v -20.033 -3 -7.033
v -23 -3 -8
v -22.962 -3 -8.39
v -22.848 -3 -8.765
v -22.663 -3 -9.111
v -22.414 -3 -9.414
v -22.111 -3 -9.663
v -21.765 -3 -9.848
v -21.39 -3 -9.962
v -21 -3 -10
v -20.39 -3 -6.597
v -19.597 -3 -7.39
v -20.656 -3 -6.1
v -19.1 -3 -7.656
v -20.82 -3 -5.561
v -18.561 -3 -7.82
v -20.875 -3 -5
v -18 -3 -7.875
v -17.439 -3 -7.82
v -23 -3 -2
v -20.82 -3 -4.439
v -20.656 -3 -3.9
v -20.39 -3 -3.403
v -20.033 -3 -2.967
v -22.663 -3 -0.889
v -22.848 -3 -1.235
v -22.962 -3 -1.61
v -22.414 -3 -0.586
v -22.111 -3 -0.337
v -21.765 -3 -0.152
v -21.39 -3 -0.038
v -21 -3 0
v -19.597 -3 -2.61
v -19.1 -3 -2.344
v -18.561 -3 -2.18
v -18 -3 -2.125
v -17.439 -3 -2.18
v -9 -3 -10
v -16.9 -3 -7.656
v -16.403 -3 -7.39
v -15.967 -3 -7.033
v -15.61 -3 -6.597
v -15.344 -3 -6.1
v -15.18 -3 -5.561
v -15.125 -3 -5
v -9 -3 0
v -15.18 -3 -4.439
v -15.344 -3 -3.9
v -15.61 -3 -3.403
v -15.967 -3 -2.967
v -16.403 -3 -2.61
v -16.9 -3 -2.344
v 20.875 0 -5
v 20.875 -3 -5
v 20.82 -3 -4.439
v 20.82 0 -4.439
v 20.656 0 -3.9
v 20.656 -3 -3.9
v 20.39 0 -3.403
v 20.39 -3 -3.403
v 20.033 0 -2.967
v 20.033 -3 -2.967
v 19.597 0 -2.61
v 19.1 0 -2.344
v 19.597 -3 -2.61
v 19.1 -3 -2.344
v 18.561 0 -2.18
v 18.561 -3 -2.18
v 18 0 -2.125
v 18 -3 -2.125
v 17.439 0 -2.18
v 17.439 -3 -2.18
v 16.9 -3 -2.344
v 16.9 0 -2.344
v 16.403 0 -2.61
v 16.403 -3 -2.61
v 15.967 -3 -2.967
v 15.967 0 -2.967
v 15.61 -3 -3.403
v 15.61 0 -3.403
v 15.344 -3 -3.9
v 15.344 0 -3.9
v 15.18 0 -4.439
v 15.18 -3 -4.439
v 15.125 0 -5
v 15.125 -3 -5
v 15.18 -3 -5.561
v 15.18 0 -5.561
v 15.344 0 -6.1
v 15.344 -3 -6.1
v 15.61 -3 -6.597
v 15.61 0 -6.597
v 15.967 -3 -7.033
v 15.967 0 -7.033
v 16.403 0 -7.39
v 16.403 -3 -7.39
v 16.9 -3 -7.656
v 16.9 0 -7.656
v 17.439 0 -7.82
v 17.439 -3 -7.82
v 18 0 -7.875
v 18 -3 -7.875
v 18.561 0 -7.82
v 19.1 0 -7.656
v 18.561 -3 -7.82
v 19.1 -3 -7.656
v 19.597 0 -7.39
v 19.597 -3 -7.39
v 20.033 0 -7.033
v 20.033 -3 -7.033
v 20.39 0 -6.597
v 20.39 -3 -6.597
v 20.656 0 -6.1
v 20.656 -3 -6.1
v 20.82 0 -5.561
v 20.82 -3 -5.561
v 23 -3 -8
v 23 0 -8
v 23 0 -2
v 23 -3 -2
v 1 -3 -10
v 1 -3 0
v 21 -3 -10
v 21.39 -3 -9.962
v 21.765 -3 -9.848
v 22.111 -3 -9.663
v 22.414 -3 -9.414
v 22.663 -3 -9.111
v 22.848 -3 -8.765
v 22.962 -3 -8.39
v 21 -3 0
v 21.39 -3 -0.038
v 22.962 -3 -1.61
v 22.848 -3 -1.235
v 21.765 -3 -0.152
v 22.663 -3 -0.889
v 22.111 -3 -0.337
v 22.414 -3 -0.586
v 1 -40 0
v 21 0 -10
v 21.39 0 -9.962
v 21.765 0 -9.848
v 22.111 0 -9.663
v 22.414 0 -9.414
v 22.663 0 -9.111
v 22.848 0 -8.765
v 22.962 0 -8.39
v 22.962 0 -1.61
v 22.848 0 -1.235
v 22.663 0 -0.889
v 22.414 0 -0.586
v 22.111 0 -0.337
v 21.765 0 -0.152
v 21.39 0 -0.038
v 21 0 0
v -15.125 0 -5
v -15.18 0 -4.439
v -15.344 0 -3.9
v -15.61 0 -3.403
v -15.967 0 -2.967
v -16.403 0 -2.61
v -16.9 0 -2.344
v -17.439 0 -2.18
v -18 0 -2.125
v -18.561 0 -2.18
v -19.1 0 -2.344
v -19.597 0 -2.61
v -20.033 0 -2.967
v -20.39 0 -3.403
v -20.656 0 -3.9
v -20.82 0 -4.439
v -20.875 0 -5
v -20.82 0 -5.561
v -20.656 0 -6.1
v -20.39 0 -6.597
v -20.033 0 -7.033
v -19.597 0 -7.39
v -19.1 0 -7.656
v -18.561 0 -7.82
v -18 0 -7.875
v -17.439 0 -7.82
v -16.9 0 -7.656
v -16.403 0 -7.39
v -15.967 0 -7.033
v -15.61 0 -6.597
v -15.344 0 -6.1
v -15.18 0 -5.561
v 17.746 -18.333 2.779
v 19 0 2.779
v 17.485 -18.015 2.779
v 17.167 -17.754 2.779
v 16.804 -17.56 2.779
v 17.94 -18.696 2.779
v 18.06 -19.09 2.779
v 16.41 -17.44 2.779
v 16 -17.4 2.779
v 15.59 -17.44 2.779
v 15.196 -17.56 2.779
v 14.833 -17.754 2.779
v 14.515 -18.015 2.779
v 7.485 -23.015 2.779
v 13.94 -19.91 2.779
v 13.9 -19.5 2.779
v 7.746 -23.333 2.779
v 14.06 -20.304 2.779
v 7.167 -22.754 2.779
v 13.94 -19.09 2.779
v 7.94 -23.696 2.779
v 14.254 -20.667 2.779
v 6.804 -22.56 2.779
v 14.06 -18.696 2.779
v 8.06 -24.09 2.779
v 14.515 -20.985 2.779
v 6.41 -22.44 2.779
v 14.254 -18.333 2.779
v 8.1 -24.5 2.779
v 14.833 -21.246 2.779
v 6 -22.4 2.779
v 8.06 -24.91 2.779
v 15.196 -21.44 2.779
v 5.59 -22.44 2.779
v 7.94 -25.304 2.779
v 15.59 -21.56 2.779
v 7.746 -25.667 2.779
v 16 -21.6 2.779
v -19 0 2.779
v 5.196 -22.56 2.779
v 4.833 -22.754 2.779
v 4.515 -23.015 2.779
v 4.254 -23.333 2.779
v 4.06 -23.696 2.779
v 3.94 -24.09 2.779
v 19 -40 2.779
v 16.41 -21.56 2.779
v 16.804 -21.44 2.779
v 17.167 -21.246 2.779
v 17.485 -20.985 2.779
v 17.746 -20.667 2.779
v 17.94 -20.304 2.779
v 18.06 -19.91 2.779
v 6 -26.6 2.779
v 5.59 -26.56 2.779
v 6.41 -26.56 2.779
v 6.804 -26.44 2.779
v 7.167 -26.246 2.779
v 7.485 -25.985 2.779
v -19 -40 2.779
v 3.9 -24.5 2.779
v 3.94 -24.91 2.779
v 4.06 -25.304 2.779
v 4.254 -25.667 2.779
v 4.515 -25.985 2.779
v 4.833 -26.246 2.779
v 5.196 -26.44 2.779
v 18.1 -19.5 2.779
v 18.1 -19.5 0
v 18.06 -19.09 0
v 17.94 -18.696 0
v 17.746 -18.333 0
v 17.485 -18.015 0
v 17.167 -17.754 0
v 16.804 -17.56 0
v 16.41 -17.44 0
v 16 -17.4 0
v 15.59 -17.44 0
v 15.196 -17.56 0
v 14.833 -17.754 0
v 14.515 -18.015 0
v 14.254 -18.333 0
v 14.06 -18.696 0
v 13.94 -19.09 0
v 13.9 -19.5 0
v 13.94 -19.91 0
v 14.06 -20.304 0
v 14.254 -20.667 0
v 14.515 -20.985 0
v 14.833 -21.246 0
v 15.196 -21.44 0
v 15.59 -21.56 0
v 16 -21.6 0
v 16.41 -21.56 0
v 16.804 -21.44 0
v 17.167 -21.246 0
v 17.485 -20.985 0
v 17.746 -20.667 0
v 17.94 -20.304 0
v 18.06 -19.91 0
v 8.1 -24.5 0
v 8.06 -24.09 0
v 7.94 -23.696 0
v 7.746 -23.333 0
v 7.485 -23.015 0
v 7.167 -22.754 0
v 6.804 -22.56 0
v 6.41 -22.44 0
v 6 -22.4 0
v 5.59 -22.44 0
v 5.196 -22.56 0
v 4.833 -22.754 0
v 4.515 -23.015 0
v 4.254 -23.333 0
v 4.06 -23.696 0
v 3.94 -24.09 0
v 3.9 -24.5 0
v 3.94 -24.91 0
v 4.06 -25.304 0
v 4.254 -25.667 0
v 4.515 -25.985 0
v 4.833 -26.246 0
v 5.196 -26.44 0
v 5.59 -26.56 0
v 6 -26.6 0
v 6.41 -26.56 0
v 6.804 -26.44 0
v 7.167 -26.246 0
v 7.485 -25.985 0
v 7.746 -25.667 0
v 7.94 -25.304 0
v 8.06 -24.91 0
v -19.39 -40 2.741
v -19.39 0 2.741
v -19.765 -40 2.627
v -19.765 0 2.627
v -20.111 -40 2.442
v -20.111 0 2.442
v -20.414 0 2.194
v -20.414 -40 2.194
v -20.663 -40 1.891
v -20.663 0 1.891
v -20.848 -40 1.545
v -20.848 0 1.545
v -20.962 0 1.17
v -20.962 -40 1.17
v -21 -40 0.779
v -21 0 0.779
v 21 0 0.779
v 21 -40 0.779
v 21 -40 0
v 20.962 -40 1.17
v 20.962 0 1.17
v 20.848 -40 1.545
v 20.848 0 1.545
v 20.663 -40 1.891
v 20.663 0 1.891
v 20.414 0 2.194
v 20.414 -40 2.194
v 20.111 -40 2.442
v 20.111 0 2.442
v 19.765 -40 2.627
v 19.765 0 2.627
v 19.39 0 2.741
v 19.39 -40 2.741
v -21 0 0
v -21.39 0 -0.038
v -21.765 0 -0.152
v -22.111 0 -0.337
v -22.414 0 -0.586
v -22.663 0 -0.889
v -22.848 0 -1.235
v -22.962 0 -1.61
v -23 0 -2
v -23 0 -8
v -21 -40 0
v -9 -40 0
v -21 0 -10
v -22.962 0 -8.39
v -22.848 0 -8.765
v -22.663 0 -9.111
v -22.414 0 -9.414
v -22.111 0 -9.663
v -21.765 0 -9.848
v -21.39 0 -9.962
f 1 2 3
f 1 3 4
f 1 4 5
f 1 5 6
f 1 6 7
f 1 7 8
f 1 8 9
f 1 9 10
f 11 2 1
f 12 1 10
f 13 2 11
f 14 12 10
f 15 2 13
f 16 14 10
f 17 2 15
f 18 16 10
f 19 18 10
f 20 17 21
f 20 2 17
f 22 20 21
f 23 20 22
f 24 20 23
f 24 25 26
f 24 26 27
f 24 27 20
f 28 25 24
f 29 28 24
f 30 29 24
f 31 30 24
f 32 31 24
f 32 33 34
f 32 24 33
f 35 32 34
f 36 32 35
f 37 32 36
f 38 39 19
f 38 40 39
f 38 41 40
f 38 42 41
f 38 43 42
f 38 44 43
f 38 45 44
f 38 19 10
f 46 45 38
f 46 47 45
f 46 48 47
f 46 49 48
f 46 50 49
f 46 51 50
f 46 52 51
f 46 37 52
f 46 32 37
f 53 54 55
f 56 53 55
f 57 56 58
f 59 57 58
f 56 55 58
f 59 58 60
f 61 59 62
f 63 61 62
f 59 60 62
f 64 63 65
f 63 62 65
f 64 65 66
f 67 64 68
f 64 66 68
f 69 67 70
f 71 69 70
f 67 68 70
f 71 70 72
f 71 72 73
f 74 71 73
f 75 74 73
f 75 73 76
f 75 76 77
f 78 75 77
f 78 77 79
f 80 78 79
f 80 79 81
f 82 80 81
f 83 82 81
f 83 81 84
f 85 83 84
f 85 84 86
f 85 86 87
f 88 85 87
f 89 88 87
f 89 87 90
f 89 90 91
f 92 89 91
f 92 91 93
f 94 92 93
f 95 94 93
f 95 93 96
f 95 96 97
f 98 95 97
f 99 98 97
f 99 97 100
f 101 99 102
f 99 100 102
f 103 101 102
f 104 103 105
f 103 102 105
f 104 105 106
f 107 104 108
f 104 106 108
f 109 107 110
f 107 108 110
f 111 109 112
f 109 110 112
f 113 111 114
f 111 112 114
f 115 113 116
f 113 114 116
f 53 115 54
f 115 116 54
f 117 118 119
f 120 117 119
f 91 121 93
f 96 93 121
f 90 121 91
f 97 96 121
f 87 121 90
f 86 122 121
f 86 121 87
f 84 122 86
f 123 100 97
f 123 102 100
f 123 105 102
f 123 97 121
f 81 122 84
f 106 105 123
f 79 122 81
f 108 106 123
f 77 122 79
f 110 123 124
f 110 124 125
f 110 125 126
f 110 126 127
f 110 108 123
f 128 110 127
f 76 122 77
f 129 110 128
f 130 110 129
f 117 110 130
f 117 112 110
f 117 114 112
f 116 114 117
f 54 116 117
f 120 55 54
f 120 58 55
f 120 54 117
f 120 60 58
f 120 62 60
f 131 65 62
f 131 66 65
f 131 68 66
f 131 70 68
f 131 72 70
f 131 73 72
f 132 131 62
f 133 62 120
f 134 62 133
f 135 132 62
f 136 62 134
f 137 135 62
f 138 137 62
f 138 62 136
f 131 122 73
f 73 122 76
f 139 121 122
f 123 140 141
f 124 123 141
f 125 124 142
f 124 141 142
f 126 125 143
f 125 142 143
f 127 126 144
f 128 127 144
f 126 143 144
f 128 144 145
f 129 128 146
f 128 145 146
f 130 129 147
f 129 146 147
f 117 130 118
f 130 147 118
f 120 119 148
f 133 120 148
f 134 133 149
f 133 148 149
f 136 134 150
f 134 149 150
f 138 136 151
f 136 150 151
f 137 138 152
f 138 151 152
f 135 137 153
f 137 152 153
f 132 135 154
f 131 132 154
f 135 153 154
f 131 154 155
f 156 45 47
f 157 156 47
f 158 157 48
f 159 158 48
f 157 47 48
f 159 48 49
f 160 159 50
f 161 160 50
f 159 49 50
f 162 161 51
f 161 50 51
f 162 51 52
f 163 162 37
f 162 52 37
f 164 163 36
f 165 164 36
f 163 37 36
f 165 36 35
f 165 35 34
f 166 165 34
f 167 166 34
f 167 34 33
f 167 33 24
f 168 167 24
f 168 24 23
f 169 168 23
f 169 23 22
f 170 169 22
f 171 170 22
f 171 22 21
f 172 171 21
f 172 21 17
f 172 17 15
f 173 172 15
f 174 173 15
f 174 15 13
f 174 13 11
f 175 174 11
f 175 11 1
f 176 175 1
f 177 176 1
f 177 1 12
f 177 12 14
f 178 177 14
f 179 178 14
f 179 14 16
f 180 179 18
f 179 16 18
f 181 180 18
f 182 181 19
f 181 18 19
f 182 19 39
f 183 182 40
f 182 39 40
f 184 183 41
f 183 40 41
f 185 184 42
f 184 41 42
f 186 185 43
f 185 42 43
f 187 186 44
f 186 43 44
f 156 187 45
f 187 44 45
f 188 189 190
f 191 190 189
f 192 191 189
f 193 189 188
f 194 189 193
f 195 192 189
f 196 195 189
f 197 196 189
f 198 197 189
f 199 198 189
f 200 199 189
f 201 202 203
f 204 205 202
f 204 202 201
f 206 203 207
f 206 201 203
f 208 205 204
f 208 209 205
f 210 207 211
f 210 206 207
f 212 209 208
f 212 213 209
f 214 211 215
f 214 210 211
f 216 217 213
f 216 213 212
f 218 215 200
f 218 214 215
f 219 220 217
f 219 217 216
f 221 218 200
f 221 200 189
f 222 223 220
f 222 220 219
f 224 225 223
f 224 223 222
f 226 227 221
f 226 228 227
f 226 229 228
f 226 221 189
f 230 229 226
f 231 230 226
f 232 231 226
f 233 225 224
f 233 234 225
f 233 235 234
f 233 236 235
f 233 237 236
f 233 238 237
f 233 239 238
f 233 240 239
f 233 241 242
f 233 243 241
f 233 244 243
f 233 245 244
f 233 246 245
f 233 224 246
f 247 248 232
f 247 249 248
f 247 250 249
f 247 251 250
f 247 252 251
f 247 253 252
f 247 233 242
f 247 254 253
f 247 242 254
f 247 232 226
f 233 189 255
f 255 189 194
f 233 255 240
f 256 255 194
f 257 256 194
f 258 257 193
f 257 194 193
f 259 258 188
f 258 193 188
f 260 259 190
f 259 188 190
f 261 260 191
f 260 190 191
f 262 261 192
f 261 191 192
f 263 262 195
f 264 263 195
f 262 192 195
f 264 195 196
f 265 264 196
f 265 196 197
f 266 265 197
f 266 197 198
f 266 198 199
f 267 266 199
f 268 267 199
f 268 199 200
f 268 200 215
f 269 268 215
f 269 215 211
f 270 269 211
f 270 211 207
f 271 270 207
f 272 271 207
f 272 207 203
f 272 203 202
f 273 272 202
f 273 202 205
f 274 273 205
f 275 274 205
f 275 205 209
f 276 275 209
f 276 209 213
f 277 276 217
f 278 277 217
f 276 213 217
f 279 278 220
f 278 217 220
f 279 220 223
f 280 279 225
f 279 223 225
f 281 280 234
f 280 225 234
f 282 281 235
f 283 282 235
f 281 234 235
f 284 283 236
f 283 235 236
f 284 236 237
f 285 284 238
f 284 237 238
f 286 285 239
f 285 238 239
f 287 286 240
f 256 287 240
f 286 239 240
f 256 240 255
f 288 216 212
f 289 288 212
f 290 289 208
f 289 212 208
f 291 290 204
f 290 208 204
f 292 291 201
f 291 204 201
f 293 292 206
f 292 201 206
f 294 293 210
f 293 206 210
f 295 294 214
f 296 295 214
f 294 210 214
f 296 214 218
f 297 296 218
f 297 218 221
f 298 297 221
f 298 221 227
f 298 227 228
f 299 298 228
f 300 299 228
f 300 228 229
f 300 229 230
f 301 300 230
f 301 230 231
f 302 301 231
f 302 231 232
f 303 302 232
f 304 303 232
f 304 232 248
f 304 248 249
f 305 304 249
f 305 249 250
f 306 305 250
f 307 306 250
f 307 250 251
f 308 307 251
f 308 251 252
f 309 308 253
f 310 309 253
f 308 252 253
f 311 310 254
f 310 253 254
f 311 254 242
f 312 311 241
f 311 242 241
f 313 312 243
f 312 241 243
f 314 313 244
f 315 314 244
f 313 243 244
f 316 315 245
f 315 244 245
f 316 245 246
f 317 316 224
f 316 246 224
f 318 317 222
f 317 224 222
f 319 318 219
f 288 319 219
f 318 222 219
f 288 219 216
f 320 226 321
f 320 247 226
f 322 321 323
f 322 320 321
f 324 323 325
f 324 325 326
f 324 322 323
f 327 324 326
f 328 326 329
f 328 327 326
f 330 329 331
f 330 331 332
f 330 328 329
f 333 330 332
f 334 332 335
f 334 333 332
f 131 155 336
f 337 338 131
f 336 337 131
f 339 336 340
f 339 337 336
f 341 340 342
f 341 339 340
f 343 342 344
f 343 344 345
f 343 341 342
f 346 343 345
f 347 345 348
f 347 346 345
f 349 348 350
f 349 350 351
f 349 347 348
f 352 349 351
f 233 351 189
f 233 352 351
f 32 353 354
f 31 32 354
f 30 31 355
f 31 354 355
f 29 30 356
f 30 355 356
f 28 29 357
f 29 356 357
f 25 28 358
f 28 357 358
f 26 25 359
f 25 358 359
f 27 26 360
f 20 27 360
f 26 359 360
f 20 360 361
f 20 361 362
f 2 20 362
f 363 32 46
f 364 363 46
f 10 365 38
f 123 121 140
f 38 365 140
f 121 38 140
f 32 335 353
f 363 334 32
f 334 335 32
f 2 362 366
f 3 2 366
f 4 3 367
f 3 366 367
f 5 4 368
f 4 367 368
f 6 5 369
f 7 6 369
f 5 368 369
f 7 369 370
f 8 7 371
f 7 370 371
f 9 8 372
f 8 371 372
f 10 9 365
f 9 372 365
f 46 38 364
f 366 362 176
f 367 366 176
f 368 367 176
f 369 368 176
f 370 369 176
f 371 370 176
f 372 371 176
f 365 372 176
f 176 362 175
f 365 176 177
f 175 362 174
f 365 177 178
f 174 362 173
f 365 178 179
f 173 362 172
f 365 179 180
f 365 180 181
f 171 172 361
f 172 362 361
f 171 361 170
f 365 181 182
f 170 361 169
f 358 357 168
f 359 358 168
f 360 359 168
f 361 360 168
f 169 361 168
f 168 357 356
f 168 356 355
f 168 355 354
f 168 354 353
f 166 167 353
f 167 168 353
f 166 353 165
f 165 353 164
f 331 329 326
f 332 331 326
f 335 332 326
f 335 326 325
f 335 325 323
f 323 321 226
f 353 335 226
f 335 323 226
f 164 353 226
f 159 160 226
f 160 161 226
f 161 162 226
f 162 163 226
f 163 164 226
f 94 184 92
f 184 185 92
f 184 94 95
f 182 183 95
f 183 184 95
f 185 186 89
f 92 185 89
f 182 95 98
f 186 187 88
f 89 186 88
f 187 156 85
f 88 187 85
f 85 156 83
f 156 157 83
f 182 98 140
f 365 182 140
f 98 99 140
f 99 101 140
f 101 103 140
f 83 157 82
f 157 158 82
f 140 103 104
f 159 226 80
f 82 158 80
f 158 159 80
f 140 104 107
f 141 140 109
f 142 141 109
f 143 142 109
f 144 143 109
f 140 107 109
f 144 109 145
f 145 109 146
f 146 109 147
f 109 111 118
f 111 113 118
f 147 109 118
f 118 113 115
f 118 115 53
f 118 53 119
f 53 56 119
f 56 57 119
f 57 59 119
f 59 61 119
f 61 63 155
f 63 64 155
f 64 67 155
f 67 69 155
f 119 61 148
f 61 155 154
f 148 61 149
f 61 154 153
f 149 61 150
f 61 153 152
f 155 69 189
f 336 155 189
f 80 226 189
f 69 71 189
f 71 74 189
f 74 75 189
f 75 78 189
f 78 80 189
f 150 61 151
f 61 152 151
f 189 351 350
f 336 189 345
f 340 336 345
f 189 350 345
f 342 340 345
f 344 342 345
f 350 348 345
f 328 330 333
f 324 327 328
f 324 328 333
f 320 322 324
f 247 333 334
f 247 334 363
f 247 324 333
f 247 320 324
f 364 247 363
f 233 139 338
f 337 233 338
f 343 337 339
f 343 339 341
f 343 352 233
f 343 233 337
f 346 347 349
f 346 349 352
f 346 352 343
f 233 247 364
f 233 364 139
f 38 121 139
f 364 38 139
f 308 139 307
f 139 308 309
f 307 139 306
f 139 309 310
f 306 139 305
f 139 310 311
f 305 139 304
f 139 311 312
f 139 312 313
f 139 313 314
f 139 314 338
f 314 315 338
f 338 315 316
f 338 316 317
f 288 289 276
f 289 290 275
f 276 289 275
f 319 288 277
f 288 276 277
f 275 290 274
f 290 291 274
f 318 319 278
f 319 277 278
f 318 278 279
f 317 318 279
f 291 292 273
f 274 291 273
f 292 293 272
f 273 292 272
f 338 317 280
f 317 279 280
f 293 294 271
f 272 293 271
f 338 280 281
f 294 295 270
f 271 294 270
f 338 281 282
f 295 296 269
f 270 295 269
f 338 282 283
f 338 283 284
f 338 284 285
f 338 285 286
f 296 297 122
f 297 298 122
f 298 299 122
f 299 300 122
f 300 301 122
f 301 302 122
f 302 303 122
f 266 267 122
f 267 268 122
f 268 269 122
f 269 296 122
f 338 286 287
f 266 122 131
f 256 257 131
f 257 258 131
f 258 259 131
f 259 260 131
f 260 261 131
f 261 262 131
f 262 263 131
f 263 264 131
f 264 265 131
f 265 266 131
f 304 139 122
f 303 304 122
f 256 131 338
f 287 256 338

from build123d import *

# Parameters (mm, degrees)
F1_DEPTH      = 3
F2_R          = 2.875
F3_DEPTH      = 25
F4_W          = 10
F4_H          = 10
F5_DEPTH      = 37
F5_DEPTH_BACK = 3
F7_DEPTH      = 25
F8_R          = 2.1
F9_DEPTH      = 25


with BuildPart() as f1:
    # F0 (on Front) → F1 (new body)
    with BuildSketch(Plane.XZ):
        with BuildLine():
            Line((21, 0), (-21, 0))
            ThreePointArc((-21, 0), (-22.414214, -0.585786), (-23, -2))
            Line((-23, -2), (-23, -8))
            ThreePointArc((-23, -8), (-22.414214, -9.414214), (-21, -10))
            Line((-21, -10), (21, -10))
            ThreePointArc((21, -10), (22.414214, -9.414214), (23, -8))
            Line((23, -8), (23, -2))
            ThreePointArc((23, -2), (22.414214, -0.585786), (21, 0))
        make_face()
    extrude(amount=F1_DEPTH)

    # F2 (on face) → F3 (cut)
    with BuildSketch(Plane.XZ.offset(3)):
        with Locations((-18, -5)):
            Circle(F2_R)
        with Locations((18, -5)):
            Circle(F2_R)
    extrude(amount=-F3_DEPTH, mode=Mode.SUBTRACT)

    # F4 (on face) → F5 (join, two sides)
    with BuildSketch(Plane.XZ.offset(3)) as f5_sk:
        with BuildLine():
            Line((-21, 0.779364), (-21, 0))
            Line((-21, 0), (-9, 0))
            Line((-9, 0), (1, 0))
            Line((1, 0), (21, 0))
            Line((21, 0), (21, 0.779364))
            ThreePointArc((21, 0.779364), (20.414214, 2.193577), (19, 2.779364))
            Line((19, 2.779364), (-19, 2.779364))
            ThreePointArc((-19, 2.779364), (-20.414214, 2.193577), (-21, 0.779364))
        make_face()
        with Locations((-4, -5)):
            Rectangle(F4_W, F4_H)
    extrude(amount=F5_DEPTH)
    extrude(f5_sk.sketch, amount=-F5_DEPTH_BACK)

    # F6 (on face) → F7 (cut)
    with BuildSketch(Plane.YZ.offset(1)):
        Polygon((-3, -10), (-40, 0), (-40, -10), align=None)
    extrude(amount=-F7_DEPTH, mode=Mode.SUBTRACT)

    # F8 (on face) → F9 (cut)
    with BuildSketch(Plane.XY.offset(2.779364)):
        with Locations((16, -19.5)):
            Circle(F8_R)
        with Locations((6, -24.5)):
            Circle(F8_R)
    extrude(amount=-F9_DEPTH, mode=Mode.SUBTRACT)


solid = f1.part
